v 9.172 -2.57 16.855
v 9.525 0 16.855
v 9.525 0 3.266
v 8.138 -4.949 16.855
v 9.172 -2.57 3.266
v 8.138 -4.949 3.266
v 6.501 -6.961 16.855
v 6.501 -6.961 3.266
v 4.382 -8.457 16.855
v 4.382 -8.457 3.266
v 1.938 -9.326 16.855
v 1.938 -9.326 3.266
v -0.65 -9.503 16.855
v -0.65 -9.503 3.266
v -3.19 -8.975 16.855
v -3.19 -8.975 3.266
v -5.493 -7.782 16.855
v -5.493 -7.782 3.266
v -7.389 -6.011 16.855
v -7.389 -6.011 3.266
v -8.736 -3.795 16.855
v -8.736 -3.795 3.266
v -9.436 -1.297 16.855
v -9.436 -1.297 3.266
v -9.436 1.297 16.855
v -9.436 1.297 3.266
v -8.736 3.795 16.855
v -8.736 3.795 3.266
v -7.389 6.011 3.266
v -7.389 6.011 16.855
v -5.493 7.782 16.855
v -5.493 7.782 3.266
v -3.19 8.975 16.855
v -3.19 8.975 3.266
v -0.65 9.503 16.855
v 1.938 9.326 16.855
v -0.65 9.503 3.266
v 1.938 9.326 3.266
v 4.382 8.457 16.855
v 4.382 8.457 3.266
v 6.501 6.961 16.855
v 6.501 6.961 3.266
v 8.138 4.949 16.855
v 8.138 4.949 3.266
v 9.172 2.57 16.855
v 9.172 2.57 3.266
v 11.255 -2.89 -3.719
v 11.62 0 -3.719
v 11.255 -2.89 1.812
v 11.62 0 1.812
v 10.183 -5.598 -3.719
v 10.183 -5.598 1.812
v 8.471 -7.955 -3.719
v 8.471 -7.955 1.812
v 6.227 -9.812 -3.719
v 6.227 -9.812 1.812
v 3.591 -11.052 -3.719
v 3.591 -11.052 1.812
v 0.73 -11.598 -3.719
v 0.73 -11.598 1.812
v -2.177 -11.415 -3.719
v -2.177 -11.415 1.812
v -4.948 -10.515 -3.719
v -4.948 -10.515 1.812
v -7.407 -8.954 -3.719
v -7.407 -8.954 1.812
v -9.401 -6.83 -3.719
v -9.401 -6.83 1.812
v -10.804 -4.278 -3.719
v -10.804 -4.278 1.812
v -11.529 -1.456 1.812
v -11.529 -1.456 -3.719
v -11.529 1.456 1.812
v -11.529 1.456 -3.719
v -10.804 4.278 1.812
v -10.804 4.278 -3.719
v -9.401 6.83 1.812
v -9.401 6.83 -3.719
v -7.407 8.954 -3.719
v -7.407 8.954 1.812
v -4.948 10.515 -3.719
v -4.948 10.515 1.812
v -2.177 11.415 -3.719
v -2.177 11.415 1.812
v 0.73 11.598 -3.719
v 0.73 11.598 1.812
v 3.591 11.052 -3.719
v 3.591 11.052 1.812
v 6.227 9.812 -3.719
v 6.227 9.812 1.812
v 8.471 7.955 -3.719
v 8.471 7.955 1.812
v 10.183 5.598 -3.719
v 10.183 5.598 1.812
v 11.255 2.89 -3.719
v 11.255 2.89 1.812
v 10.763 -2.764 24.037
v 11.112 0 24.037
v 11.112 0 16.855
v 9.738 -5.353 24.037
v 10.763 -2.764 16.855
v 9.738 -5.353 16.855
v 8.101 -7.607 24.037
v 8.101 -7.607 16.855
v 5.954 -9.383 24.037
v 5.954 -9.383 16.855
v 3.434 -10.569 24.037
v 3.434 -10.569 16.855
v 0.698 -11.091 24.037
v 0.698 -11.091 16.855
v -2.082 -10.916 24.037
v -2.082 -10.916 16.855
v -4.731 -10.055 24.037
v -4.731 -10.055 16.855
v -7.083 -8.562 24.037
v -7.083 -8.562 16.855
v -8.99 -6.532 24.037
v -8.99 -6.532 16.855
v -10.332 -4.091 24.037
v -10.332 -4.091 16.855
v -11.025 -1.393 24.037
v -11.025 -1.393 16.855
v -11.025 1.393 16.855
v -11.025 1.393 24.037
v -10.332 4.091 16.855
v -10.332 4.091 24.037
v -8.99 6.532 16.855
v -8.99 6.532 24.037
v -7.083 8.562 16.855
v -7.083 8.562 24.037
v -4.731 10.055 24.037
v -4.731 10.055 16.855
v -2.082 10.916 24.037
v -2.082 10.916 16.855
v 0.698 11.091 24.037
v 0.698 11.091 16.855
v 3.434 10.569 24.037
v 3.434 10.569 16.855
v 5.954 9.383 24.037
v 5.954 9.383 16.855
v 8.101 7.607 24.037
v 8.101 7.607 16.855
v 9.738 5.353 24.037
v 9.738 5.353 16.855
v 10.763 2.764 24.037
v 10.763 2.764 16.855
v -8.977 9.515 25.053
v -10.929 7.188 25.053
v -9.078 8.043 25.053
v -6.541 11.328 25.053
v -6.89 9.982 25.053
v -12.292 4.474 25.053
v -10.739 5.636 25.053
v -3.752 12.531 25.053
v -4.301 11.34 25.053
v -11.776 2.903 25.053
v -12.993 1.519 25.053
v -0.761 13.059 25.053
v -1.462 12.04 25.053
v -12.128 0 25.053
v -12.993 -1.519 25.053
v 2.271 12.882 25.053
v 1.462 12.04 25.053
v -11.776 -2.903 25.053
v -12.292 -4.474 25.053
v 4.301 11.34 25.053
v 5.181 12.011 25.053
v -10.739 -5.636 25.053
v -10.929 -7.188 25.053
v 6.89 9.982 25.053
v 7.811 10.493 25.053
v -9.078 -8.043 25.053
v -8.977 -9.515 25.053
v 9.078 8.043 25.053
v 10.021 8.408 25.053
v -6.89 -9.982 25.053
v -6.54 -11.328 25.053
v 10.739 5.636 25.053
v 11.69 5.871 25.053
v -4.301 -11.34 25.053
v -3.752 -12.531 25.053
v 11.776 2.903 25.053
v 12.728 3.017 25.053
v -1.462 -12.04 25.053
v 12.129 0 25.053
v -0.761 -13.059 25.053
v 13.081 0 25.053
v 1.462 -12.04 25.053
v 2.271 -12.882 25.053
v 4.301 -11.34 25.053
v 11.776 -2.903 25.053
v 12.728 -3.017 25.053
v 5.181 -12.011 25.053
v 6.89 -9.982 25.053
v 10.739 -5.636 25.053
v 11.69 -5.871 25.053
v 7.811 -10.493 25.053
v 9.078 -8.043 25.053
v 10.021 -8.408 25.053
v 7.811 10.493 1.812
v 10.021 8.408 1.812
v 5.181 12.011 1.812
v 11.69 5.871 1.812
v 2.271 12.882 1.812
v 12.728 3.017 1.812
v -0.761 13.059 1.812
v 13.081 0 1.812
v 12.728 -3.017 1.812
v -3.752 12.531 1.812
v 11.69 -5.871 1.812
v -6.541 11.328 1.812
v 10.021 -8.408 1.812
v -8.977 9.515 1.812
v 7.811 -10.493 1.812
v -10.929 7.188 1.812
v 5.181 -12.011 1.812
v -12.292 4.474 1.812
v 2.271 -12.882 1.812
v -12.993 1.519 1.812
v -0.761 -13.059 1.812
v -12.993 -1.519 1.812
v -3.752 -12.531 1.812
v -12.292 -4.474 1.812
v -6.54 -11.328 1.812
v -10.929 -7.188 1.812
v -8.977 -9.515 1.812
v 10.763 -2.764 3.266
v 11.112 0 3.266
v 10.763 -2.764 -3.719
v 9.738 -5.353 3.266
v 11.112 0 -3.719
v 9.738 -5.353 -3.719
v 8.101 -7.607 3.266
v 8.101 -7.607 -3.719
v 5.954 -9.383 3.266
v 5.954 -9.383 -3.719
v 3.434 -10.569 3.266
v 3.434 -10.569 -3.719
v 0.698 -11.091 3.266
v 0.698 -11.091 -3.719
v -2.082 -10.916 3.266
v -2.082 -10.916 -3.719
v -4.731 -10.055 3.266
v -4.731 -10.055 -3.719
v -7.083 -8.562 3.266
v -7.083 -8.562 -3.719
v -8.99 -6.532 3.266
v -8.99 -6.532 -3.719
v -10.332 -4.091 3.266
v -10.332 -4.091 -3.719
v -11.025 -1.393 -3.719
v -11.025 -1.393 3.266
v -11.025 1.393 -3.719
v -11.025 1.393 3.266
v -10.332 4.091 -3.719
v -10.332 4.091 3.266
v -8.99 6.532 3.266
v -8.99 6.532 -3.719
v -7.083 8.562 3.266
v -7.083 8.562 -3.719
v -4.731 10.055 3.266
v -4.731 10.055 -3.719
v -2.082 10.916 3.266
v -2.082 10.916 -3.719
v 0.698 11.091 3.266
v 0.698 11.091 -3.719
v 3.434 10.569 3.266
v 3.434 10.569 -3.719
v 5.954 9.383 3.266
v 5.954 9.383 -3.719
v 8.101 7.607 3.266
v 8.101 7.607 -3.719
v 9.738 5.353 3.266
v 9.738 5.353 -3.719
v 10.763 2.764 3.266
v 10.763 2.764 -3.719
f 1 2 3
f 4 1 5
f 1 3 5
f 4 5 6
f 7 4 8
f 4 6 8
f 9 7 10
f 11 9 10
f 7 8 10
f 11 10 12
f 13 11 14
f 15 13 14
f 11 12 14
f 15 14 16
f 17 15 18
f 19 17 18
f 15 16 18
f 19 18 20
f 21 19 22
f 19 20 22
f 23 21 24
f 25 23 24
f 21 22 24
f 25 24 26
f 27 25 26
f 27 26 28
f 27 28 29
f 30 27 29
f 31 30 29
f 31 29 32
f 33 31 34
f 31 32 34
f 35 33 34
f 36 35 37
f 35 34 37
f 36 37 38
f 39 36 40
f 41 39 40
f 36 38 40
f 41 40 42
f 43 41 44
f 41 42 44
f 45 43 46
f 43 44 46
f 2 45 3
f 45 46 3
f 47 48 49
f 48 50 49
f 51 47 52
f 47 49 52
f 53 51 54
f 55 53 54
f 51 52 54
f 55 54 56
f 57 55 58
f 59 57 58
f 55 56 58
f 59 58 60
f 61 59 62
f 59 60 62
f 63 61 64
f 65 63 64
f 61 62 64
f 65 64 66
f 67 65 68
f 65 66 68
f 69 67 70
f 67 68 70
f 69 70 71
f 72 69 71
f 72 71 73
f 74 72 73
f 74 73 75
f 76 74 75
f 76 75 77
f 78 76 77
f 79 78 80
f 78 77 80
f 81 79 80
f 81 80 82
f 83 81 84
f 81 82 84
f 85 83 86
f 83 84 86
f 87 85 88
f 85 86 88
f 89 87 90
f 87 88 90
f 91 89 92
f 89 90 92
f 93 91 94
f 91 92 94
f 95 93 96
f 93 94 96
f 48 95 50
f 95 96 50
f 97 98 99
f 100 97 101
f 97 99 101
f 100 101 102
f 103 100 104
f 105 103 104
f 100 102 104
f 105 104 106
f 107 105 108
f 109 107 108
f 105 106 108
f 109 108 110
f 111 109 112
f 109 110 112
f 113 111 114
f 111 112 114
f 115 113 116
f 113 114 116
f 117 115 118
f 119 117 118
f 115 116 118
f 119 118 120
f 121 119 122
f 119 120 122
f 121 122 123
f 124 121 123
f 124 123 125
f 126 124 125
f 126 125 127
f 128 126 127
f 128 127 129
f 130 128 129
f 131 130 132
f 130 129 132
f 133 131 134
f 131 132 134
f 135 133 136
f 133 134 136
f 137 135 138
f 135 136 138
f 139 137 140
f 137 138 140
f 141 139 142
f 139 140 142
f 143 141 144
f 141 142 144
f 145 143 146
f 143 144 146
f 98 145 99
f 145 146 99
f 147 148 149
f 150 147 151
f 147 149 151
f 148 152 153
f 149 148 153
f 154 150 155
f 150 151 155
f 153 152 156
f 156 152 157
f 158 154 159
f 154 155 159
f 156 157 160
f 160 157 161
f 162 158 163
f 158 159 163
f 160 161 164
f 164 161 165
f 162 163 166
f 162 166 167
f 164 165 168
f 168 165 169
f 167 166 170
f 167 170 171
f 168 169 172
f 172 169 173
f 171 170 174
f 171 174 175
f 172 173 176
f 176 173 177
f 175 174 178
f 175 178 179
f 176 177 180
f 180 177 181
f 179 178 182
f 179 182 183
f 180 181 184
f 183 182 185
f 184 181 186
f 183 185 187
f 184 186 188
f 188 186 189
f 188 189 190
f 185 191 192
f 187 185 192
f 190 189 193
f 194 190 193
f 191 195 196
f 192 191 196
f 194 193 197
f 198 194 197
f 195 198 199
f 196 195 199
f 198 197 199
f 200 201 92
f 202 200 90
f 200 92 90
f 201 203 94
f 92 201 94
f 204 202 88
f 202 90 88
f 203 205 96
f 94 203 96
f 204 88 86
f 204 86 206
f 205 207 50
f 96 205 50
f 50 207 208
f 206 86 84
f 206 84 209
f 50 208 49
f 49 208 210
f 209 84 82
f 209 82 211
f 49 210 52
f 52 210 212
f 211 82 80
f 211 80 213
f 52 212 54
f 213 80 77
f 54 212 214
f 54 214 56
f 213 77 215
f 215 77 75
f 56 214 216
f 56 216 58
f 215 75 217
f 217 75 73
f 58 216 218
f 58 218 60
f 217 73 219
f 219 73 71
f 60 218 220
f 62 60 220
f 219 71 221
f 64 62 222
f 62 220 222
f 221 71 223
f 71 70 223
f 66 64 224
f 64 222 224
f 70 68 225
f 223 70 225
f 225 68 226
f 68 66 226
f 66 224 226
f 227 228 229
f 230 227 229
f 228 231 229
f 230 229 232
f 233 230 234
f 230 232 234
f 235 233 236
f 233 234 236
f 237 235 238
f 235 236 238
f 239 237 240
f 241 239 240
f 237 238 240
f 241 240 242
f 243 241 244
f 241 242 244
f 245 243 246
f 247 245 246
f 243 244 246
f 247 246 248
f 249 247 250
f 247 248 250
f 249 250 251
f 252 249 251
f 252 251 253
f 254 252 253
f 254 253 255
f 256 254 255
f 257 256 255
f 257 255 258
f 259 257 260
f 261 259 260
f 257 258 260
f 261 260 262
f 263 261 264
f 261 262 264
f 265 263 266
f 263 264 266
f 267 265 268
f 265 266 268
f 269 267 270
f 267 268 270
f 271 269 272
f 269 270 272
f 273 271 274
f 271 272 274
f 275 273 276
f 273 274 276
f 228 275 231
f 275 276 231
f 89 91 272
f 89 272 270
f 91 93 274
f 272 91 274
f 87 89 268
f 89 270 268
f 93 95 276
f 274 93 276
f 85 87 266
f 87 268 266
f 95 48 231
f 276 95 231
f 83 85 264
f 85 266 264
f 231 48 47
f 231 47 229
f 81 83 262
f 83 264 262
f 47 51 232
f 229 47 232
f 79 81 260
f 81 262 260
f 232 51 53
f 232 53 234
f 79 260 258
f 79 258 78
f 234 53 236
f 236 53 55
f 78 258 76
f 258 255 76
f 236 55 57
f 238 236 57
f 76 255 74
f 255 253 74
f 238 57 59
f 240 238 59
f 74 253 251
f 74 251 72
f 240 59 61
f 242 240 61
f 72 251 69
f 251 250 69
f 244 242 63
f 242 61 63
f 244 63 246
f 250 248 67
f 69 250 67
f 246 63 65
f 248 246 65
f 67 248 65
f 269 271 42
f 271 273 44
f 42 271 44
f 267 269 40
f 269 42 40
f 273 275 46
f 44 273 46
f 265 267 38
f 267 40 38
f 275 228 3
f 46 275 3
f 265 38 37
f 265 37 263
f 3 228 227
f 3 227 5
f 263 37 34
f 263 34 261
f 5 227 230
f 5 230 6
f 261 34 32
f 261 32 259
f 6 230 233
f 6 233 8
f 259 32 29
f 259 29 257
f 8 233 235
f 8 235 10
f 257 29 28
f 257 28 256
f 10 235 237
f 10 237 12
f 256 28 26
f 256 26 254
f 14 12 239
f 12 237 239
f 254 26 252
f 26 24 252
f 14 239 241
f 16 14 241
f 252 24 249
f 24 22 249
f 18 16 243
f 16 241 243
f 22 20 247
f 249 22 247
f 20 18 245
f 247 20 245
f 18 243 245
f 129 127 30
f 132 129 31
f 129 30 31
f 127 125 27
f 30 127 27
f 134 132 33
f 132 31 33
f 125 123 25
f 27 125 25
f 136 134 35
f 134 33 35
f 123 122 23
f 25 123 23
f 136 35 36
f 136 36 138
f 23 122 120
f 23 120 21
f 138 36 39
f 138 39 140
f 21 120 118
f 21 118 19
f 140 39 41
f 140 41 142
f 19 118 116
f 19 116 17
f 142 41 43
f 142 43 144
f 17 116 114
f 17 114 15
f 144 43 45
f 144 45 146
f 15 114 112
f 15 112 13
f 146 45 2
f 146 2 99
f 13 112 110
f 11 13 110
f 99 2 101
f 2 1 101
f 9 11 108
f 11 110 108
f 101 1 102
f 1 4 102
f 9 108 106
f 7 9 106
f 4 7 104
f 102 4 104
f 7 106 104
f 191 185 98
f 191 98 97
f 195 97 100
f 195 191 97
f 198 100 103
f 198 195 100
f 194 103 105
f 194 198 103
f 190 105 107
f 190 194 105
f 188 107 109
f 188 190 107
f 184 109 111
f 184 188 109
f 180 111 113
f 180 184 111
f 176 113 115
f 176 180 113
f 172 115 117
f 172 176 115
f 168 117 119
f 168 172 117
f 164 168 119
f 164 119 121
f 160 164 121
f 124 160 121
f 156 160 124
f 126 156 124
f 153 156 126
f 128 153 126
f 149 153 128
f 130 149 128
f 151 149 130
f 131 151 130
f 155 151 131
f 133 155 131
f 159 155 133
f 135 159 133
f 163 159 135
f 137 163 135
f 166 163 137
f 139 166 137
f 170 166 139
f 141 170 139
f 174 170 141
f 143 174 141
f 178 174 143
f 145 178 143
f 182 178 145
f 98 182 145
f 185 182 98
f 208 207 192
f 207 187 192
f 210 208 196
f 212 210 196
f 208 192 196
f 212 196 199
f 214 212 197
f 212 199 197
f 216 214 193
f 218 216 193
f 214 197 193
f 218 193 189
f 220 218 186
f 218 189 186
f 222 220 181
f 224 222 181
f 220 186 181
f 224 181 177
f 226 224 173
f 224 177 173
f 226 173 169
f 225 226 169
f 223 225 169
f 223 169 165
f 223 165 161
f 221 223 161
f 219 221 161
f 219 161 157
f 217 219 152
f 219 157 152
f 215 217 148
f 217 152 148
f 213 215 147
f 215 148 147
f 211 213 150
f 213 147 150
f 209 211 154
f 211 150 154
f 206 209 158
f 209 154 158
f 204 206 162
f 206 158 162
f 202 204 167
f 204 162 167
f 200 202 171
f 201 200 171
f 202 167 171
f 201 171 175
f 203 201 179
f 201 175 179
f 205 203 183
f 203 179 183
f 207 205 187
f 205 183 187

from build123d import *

# Parameters (mm, degrees)
F2_SIZE = 1.016


with BuildPart() as f1:
    # F0 (on Front) → F1 (revolve)
    with BuildSketch(Plane.XZ):
        Polygon((11.1125, 25.053447), (11.1125, 23.840199), (11.1125, 16.855199), (9.525, 16.855199), (9.525, 3.266199), (11.1125, 3.266199), (11.1125, -3.718801), (11.6205, -3.718801), (11.6205, 1.812447), (13.081, 1.812447), (13.081, 25.053447), align=None)
    revolve(axis=Axis((0, 0, -1.874024), (0, 0, -1)))

    # F2
    f2_edges = [f1.edges().sort_by_distance(p)[0] for p in [
        (-11.1125, 0, 25.053447),
    ]]
    chamfer(f2_edges, length=F2_SIZE)


solid = f1.part
